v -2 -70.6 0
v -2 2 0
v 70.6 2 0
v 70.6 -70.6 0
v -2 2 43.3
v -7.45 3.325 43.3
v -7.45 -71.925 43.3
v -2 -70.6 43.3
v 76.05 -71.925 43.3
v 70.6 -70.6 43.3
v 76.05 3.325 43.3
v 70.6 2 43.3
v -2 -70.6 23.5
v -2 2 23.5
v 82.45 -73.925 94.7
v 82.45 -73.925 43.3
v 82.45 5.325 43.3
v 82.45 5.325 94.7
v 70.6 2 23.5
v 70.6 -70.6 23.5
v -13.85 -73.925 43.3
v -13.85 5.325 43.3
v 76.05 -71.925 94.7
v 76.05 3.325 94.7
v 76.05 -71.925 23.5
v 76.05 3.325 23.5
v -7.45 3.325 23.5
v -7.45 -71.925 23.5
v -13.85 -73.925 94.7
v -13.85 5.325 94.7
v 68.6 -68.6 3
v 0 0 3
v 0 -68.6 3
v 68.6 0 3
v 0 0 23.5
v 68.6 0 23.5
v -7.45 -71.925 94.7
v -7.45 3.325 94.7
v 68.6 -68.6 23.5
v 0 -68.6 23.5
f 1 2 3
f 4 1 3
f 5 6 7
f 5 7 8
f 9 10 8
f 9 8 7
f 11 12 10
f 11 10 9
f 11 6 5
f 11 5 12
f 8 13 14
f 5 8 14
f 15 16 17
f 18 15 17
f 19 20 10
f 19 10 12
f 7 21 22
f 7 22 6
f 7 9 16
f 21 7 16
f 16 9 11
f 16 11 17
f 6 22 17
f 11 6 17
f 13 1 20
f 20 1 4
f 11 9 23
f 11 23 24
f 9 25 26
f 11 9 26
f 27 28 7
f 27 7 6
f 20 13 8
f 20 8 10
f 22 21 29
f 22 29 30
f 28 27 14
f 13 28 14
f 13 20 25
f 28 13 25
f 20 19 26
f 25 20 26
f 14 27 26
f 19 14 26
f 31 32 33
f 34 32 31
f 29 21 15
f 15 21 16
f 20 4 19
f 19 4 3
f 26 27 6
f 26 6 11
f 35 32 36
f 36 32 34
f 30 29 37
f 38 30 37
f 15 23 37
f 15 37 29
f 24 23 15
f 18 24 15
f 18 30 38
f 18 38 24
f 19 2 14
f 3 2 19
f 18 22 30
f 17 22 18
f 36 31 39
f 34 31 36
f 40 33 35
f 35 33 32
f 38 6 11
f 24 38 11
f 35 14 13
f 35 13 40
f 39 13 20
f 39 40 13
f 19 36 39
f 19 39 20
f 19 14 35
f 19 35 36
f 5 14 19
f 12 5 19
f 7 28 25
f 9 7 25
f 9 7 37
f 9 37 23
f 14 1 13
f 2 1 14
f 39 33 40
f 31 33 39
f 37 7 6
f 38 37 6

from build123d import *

# Parameters (mm, degrees)
F0_W     = 68.6
F0_H     = 68.6
F1_DEPTH = 3
F0_W_2   = 72.6
F0_H_2   = 72.6
F2_DEPTH = 23.5
F3_W     = 83.5
F3_H     = 75.25
F3_W_2   = 72.6
F3_H_2   = 72.6
F4_DEPTH = 19.8
F5_W     = 96.3
F5_H     = 79.25
F5_W_2   = 83.5
F5_H_2   = 75.25
F6_DEPTH = 51.4


with BuildPart() as f1:
    # F0 (on Top) → F1 (new body)
    with BuildSketch(Plane.XY):
        with Locations((34.3, -34.3)):
            Rectangle(F0_W, F0_H)
    extrude(amount=F1_DEPTH)

    # F0 (on Top) → F2 (join)
    with BuildSketch(Plane.XY):
        with Locations((34.3, -34.3)):
            Rectangle(F0_W_2, F0_H_2)
        with Locations((34.3, -34.3)):
            Rectangle(F0_W, F0_H, mode=Mode.SUBTRACT)
    extrude(amount=F2_DEPTH)


with BuildPart() as f4:
    # F3 (on face) → F4 (new body)
    with BuildSketch(Plane.XY.offset(23.5)):
        with Locations((34.3, -34.3)):
            Rectangle(F3_W, F3_H)
        with Locations((34.3, -34.3)):
            Rectangle(F3_W_2, F3_H_2, mode=Mode.SUBTRACT)
    extrude(amount=F4_DEPTH)


with BuildPart() as f6:
    # F5 (on face) → F6 (new body)
    with BuildSketch(Plane.XY.offset(43.3)):
        with Locations((34.3, -34.3)):
            Rectangle(F5_W, F5_H)
        with Locations((34.3, -34.3)):
            Rectangle(F5_W_2, F5_H_2, mode=Mode.SUBTRACT)
    extrude(amount=F6_DEPTH)


solid = Compound([f1.part, f4.part, f6.part])
